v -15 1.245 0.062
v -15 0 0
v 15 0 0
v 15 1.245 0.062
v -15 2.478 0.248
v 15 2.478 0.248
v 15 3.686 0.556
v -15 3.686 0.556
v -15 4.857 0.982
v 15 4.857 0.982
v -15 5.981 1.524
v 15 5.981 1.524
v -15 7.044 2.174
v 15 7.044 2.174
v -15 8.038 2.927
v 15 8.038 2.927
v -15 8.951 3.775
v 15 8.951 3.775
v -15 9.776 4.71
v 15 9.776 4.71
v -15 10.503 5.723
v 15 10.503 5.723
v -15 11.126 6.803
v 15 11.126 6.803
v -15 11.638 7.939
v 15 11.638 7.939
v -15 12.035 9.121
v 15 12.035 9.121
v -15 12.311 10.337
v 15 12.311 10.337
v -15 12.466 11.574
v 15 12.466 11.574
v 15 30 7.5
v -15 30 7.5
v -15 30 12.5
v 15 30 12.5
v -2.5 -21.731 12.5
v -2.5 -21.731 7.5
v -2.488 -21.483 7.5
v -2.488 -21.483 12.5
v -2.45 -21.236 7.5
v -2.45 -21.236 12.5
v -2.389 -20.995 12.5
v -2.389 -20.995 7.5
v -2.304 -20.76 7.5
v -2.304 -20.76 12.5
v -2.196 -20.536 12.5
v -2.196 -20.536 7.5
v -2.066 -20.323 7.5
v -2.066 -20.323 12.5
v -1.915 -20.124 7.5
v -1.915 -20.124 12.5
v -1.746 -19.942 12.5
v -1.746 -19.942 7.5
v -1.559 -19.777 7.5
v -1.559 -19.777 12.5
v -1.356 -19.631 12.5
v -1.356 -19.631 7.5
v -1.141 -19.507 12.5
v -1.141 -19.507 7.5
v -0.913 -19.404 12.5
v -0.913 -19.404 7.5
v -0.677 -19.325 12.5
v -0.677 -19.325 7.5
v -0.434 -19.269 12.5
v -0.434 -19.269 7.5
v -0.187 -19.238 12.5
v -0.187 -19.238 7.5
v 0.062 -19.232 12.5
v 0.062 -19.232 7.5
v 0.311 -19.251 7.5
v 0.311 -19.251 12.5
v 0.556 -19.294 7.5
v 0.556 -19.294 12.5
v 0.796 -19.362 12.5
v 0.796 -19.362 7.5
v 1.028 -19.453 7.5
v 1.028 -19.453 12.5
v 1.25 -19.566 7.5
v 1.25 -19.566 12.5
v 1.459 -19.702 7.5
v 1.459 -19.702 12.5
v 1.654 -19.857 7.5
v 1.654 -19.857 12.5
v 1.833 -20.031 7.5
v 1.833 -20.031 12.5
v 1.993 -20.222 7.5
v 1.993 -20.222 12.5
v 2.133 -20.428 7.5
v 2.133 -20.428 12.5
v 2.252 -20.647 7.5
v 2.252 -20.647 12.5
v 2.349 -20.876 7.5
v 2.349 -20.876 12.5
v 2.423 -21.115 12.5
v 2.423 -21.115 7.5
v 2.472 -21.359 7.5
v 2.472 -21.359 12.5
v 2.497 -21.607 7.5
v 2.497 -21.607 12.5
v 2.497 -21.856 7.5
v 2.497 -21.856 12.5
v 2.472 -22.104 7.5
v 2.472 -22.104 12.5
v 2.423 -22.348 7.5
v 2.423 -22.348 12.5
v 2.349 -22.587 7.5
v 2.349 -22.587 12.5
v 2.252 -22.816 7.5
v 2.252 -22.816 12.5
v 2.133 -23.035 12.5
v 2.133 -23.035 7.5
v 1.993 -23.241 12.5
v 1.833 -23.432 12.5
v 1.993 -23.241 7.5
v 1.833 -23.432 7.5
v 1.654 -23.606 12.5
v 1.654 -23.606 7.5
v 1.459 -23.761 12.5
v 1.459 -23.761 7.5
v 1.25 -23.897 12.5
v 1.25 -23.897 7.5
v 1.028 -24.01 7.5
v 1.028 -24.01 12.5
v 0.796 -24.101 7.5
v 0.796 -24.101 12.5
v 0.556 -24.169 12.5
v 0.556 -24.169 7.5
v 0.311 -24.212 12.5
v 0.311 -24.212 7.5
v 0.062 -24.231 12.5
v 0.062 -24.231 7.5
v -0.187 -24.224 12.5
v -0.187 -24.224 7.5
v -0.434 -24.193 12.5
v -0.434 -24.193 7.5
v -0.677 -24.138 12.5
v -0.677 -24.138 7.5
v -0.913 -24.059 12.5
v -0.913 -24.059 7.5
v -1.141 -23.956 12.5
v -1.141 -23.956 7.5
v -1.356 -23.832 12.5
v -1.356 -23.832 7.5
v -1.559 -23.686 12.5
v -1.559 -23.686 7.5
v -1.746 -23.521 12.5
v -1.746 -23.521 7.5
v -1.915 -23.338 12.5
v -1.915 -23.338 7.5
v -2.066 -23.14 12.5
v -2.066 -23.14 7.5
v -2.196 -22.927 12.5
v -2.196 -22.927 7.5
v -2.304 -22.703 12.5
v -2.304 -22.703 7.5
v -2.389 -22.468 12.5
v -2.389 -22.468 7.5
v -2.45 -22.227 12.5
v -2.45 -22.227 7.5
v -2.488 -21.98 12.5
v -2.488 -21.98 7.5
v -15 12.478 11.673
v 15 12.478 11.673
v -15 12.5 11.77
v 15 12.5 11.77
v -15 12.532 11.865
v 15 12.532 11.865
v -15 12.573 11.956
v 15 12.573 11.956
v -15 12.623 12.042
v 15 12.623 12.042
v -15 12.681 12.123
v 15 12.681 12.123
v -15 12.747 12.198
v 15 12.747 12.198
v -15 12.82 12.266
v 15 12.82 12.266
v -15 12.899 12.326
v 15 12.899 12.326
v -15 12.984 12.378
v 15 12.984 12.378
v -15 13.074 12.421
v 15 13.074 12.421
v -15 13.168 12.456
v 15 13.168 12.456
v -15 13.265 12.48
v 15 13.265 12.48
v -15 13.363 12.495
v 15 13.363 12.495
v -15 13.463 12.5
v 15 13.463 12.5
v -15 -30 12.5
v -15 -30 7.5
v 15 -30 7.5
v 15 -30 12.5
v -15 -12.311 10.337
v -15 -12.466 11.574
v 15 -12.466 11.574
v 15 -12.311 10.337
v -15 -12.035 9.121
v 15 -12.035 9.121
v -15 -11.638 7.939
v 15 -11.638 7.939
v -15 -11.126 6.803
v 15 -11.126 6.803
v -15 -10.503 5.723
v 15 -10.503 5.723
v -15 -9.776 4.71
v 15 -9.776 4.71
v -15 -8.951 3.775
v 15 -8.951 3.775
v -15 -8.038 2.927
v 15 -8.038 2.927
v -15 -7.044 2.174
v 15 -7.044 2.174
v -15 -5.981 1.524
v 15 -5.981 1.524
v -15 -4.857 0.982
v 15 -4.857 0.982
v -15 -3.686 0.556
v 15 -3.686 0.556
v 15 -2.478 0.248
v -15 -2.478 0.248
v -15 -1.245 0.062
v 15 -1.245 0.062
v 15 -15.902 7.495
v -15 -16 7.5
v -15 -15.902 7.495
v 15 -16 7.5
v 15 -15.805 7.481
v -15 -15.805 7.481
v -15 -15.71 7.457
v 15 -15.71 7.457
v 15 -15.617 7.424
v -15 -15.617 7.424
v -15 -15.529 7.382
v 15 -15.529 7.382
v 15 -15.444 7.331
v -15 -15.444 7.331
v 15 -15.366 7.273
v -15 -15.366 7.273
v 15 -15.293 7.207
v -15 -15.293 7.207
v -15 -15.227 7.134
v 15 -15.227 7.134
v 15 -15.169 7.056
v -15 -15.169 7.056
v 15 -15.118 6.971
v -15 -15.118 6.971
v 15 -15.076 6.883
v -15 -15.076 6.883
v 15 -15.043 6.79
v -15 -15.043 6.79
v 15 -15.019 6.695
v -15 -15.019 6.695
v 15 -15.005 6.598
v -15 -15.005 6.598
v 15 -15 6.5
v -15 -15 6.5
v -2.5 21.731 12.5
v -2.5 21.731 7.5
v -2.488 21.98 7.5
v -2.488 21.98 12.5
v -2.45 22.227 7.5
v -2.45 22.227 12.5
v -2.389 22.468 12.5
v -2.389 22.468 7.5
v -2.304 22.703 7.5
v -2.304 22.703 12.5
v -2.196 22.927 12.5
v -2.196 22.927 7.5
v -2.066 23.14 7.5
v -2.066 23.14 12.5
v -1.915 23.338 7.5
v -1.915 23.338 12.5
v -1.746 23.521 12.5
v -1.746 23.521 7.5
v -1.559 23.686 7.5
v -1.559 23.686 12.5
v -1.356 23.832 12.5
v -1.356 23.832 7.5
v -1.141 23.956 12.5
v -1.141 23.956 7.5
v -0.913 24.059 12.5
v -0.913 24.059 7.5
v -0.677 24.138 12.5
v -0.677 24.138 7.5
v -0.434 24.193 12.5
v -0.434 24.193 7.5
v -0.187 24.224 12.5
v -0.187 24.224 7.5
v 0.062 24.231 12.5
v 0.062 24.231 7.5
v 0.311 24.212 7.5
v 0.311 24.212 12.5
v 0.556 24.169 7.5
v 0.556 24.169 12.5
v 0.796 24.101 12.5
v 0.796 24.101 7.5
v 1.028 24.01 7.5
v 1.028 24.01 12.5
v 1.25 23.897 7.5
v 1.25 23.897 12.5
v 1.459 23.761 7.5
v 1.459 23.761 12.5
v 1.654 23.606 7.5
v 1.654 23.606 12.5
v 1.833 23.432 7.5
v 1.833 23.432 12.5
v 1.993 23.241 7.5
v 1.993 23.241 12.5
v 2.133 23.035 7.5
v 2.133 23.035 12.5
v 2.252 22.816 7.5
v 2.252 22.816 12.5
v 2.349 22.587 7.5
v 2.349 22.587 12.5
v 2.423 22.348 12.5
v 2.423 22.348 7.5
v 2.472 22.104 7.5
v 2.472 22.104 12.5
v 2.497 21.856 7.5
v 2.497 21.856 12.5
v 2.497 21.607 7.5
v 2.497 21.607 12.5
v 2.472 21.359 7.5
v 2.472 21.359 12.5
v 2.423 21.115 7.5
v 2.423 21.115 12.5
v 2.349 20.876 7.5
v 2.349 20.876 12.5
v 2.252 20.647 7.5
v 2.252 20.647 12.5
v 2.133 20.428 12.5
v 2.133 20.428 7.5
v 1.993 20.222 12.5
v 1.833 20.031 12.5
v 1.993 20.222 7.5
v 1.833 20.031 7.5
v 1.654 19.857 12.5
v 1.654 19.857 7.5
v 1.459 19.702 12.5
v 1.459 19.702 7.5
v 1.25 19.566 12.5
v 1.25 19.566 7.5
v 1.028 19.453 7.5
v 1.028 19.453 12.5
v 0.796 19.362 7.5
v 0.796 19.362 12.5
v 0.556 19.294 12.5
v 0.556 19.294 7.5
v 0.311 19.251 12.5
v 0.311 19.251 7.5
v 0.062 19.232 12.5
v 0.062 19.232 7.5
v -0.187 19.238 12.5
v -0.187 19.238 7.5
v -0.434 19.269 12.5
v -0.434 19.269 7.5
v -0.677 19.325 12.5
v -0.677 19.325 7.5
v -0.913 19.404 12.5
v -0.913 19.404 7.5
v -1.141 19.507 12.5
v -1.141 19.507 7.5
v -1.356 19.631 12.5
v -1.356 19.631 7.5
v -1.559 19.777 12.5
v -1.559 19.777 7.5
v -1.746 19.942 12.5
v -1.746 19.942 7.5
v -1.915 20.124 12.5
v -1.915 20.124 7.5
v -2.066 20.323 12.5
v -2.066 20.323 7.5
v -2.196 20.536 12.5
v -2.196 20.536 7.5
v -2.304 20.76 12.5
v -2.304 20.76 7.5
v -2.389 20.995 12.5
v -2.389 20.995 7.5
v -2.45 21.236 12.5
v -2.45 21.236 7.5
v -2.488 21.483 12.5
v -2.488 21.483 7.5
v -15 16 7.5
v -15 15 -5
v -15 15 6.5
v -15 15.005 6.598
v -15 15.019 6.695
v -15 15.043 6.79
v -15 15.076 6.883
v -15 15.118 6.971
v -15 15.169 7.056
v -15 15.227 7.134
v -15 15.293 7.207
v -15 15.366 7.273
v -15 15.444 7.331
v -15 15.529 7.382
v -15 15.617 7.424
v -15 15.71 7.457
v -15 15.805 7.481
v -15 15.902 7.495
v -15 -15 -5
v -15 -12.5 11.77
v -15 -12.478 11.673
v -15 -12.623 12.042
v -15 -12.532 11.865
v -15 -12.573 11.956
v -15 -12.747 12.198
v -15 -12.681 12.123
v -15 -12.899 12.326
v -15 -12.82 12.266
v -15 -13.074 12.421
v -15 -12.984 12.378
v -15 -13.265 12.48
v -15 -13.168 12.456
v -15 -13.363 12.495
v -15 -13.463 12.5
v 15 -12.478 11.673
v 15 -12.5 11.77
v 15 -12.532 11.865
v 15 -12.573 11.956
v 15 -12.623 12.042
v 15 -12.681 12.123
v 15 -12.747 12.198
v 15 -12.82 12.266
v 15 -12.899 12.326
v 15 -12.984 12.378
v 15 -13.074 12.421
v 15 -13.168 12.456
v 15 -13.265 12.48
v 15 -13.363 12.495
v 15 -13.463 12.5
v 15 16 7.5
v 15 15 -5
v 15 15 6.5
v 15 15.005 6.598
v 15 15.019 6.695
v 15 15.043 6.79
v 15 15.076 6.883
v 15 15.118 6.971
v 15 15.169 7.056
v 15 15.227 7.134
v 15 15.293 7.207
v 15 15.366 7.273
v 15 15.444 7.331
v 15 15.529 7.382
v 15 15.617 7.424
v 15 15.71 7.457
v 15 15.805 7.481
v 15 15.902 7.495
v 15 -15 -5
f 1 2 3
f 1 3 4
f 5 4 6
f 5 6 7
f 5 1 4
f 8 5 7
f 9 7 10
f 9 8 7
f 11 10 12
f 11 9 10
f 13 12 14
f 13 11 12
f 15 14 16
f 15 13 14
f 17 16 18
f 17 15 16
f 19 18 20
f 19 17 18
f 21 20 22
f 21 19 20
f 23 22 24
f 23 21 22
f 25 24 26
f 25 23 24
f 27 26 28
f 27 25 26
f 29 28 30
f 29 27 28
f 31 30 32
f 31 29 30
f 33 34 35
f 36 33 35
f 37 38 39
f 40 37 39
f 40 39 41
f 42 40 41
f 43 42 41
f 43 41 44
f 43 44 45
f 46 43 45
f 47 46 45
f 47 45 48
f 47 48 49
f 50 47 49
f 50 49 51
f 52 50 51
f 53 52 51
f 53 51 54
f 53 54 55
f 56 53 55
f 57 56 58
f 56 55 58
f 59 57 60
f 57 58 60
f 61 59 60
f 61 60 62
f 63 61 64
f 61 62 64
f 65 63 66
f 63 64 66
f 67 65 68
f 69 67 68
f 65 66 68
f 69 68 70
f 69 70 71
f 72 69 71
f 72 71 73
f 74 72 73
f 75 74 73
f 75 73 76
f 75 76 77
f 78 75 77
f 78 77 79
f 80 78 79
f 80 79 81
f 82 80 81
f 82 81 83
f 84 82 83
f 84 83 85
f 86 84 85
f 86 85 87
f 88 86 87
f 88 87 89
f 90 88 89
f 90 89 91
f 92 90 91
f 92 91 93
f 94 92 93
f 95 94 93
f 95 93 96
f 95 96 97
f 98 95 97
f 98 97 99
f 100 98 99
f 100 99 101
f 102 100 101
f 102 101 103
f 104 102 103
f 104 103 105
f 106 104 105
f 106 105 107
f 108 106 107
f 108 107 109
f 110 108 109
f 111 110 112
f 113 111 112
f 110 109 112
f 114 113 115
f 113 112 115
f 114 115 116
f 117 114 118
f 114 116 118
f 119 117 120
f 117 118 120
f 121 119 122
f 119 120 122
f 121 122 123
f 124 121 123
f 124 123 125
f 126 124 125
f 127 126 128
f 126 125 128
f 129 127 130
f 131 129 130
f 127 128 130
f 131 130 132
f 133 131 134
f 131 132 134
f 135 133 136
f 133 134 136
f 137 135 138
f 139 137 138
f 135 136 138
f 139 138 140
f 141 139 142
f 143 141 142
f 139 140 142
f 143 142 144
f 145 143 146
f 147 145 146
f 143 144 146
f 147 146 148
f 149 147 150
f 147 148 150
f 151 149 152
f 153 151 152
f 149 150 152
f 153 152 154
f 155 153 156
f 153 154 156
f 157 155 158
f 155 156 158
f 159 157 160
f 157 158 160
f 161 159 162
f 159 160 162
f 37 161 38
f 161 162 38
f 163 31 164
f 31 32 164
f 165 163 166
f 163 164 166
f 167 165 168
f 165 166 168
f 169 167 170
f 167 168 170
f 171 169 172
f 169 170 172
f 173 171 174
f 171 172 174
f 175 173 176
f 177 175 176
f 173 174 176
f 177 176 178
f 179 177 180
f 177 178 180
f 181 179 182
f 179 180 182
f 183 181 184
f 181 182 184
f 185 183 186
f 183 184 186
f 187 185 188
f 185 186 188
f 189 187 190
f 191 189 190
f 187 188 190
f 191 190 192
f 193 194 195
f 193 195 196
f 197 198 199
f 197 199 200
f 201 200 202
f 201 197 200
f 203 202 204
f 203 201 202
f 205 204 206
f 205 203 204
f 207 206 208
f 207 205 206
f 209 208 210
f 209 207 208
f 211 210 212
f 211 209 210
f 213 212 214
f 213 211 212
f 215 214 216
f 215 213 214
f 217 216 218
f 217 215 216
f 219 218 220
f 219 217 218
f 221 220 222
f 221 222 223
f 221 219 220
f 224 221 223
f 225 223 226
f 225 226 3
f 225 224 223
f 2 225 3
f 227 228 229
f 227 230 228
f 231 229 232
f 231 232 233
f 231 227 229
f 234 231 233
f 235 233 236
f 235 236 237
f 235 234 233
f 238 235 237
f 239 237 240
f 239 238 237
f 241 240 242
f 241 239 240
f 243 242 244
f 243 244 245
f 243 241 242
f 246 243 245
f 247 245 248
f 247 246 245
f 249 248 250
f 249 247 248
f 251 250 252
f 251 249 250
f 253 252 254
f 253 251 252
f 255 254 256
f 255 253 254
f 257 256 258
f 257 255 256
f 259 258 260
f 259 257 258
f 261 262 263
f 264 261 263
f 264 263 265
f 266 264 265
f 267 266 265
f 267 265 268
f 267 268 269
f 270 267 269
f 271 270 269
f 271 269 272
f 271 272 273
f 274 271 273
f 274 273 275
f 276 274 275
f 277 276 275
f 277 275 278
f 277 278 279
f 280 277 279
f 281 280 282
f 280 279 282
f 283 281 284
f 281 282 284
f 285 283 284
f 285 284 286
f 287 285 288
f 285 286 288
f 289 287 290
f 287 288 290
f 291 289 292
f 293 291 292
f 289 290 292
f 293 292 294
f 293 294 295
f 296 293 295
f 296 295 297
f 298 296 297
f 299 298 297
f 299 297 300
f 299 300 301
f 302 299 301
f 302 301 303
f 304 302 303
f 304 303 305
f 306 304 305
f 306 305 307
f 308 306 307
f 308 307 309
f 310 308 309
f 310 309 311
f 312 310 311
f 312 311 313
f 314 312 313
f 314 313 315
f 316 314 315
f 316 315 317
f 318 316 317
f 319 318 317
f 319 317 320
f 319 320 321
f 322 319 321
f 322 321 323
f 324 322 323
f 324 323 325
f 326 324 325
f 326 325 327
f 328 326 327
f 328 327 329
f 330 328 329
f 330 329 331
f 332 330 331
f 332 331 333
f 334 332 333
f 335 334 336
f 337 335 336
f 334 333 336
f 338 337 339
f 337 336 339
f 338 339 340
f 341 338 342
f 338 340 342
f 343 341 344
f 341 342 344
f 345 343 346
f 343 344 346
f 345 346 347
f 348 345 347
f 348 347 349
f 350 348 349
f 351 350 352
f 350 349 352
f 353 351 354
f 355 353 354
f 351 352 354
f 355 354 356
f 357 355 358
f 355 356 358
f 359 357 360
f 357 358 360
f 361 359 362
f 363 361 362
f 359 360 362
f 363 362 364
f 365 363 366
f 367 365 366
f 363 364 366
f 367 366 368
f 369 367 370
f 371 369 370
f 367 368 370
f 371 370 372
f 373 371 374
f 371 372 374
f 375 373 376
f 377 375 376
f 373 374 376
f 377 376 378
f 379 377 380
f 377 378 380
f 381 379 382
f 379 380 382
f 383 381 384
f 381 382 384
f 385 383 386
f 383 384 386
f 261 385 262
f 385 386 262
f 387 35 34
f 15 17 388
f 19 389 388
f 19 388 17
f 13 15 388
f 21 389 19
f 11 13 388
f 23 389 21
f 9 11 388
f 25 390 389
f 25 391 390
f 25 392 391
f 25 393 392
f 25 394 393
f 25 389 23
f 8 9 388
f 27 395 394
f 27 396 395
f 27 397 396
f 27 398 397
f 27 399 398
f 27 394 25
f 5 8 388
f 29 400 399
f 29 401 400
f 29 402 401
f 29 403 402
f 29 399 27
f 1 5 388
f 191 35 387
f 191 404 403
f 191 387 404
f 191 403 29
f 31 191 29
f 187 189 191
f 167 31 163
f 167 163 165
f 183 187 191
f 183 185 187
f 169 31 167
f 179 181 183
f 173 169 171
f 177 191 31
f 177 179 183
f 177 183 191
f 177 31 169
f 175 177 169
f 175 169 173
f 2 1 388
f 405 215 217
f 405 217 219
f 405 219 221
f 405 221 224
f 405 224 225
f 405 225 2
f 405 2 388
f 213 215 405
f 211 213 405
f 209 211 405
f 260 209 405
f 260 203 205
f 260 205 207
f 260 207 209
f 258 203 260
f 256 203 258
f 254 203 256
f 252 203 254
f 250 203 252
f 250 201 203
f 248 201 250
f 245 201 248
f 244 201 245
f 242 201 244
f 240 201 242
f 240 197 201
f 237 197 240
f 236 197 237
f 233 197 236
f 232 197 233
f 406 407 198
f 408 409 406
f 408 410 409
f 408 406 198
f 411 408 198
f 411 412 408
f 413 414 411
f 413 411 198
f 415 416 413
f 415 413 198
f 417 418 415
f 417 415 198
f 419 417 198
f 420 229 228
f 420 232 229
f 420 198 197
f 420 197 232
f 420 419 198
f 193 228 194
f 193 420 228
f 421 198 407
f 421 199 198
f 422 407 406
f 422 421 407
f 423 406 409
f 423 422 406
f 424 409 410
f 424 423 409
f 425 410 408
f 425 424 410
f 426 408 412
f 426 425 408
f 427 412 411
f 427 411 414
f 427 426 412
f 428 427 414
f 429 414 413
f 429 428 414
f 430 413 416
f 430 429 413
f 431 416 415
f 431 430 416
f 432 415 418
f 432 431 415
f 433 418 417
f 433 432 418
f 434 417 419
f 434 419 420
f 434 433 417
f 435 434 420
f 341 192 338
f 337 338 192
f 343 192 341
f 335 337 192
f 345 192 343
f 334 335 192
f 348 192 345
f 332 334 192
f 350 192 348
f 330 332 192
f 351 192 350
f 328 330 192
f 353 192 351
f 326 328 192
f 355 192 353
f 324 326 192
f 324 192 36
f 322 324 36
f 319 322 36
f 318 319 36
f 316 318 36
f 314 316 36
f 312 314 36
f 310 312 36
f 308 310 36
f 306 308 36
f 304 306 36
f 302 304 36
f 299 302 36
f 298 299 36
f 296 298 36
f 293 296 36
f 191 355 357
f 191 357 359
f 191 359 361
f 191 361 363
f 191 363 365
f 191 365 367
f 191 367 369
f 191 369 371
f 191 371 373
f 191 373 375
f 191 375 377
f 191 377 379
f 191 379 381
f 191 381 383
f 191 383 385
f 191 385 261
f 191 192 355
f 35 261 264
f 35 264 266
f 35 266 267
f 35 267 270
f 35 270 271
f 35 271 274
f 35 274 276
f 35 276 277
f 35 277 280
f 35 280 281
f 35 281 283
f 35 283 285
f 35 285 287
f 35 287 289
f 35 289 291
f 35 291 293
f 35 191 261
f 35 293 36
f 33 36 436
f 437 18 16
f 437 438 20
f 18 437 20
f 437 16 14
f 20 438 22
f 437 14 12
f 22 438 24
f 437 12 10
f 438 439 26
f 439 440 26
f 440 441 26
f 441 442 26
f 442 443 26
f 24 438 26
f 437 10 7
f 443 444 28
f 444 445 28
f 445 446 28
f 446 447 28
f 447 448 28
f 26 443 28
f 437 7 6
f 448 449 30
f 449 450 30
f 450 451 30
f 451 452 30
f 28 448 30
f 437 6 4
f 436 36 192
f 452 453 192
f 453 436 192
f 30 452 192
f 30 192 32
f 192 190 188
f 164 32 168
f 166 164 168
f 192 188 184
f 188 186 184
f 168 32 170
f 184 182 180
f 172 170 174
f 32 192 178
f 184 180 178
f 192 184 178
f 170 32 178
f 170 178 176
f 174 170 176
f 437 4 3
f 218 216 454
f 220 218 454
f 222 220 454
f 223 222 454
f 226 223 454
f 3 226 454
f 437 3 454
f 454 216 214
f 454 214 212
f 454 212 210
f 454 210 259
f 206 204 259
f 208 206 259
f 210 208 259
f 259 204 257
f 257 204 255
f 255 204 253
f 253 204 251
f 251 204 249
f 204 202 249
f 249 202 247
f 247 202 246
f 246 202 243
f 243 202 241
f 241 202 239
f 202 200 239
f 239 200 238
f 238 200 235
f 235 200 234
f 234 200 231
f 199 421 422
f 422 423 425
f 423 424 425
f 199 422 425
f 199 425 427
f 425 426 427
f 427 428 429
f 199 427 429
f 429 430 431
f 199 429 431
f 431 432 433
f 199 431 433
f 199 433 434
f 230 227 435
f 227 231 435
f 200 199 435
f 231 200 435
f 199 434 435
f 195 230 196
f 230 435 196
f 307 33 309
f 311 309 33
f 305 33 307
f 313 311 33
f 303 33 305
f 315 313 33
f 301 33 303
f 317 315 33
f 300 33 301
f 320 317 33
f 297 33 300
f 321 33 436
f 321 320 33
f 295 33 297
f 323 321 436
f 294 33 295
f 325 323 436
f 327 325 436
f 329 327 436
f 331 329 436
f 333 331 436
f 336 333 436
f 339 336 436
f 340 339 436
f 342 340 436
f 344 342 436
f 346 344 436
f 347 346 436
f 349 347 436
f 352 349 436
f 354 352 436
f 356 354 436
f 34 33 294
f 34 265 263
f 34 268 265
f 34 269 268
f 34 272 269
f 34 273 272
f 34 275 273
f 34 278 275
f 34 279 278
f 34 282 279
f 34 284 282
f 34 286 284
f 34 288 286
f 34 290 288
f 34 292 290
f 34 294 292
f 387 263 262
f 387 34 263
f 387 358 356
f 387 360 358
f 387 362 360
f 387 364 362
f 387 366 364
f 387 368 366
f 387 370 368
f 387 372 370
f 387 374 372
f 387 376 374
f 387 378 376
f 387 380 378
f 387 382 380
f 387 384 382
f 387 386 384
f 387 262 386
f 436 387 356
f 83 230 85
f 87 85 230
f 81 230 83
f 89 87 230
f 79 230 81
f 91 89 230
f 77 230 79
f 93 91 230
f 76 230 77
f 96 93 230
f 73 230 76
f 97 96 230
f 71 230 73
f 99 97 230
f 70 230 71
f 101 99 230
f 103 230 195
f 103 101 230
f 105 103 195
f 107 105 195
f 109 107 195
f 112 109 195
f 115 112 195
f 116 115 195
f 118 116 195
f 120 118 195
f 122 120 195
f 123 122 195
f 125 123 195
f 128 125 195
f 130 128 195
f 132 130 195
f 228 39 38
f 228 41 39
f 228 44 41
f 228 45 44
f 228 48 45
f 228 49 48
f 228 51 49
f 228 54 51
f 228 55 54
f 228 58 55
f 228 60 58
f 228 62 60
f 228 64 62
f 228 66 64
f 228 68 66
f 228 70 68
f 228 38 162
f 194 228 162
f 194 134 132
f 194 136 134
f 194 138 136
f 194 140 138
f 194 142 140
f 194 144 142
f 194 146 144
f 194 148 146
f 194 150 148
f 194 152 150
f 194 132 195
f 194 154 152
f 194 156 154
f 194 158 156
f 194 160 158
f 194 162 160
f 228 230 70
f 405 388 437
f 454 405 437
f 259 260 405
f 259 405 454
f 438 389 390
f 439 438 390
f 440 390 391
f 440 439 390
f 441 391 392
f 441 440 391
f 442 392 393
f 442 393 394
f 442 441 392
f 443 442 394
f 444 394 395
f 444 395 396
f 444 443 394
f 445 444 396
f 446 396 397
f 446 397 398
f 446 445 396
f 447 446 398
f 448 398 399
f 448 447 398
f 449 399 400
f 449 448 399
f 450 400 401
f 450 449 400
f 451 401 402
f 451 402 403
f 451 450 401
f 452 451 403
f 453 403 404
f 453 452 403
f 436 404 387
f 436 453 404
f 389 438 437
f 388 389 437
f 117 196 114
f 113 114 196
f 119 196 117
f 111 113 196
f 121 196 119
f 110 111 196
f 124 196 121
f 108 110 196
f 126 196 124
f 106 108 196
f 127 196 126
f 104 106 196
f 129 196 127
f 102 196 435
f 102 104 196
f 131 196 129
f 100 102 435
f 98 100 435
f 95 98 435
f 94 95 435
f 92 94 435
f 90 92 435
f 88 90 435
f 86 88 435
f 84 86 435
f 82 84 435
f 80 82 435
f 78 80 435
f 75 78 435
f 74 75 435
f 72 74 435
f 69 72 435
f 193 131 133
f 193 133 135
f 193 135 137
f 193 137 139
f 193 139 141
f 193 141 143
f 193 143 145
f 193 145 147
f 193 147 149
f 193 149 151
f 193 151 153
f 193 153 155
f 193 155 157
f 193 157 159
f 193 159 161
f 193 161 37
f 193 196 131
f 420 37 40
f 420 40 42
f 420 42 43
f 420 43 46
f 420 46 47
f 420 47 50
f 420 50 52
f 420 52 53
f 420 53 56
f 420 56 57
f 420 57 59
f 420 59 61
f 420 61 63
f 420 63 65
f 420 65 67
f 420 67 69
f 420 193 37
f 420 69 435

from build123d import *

# Parameters (mm, degrees)
F0_W     = 30
F0_H     = 30
F1_DEPTH = 5
F2_W     = 15
F2_H     = 5
F3_DEPTH = 30
F4_R     = 1
F6_D     = 5


with BuildPart() as f1:
    # F0 (on Top) → F1 (new body)
    with BuildSketch(Plane.XY):
        Rectangle(F0_W, F0_H)
    extrude(amount=-F1_DEPTH)

    # F2 (on face) → F3 (join)
    with BuildSketch(Plane(origin=(-15, 0, 0), x_dir=(0, -1, 0), z_dir=(-1, 0, 0))):
        with Locations((-22.5, 10)):
            Rectangle(F2_W, F2_H)
        with BuildLine():
            ThreePointArc((0, 0), (-8.8388347648, 3.6611652352), (-12.5, 12.5))
            Line((-12.5, 12.5), (-15, 12.5))
            Line((-15, 12.5), (-15, 7.5))
            Line((-15, 7.5), (-15, 0))
            Line((-15, 0), (0, 0))
        make_face()
        with BuildLine():
            ThreePointArc((12.5, 12.5), (8.8388347648, 3.6611652352), (0, 0))
            Line((0, 0), (15, 0))
            Line((15, 0), (15, 7.5))
            Line((15, 7.5), (15, 12.5))
            Line((15, 12.5), (12.5, 12.5))
        make_face()
        with Locations((22.5, 10)):
            Rectangle(F2_W, F2_H)
    extrude(amount=-F3_DEPTH)

    # F4
    f4_edges = [f1.edges().sort_by_distance(p)[0] for p in [
        (0, 12.5, 12.5),
        (0, -15, 7.5),
        (0, 15, 7.5),
        (0, -12.5, 12.5),
    ]]
    fillet(f4_edges, radius=F4_R)

    # F6 (through all)
    with Locations(Plane.XY.offset(12.5)):
        with Locations((0, 21.7314560089), (0, -21.7314560089)):
            Hole(F6_D / 2)


solid = f1.part
